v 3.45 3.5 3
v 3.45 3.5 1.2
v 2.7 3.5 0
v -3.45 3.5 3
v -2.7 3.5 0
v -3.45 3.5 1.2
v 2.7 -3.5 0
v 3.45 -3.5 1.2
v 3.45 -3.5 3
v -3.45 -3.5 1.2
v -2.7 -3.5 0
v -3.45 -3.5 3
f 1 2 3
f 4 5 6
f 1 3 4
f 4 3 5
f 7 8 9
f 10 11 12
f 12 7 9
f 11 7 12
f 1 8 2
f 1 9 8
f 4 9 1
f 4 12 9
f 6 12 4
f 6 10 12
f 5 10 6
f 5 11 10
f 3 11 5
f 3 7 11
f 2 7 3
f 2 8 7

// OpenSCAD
/*
  Through Hole Micro female Micro USB connector
  Based on WERI PART NO: 614 105 150 721
  http://www.mouser.com/ds/2/445/614105150721-469235.pdf

  Aaron Ciuffo
  23 December 2013
  GPL V3

*/

/*
      portTopLen
    -----------------
    |               | portSide
    |               |
    \               /
     \             /
      -------------
       portBottomLen
*/


module usbMicro(center = false) {
  portTopLen = 6.9;
  portSide = 1.8;
  portBottomLen = 5.4;
  portSideTotal = 3; 
  portDepth = 7;

  trans = center == false ? 0 : portSideTotal/2; 

  points = [[0, 0], // 0
            [portTopLen, 0], //1
            [portTopLen, -portSide], //2
            [portTopLen/2+portBottomLen/2, -portSideTotal], //3
            [portTopLen/2-portBottomLen/2, -portSideTotal], //4
            [0, - portSide]];
  translate([-portTopLen/2, portDepth/2, portSideTotal-trans])
  rotate([90, 0, 0])
  //translate([-portTopLen/2, portSideTotal/2, 0])
  linear_extrude(height = portDepth)
  polygon(points);
}

usbMicro();
